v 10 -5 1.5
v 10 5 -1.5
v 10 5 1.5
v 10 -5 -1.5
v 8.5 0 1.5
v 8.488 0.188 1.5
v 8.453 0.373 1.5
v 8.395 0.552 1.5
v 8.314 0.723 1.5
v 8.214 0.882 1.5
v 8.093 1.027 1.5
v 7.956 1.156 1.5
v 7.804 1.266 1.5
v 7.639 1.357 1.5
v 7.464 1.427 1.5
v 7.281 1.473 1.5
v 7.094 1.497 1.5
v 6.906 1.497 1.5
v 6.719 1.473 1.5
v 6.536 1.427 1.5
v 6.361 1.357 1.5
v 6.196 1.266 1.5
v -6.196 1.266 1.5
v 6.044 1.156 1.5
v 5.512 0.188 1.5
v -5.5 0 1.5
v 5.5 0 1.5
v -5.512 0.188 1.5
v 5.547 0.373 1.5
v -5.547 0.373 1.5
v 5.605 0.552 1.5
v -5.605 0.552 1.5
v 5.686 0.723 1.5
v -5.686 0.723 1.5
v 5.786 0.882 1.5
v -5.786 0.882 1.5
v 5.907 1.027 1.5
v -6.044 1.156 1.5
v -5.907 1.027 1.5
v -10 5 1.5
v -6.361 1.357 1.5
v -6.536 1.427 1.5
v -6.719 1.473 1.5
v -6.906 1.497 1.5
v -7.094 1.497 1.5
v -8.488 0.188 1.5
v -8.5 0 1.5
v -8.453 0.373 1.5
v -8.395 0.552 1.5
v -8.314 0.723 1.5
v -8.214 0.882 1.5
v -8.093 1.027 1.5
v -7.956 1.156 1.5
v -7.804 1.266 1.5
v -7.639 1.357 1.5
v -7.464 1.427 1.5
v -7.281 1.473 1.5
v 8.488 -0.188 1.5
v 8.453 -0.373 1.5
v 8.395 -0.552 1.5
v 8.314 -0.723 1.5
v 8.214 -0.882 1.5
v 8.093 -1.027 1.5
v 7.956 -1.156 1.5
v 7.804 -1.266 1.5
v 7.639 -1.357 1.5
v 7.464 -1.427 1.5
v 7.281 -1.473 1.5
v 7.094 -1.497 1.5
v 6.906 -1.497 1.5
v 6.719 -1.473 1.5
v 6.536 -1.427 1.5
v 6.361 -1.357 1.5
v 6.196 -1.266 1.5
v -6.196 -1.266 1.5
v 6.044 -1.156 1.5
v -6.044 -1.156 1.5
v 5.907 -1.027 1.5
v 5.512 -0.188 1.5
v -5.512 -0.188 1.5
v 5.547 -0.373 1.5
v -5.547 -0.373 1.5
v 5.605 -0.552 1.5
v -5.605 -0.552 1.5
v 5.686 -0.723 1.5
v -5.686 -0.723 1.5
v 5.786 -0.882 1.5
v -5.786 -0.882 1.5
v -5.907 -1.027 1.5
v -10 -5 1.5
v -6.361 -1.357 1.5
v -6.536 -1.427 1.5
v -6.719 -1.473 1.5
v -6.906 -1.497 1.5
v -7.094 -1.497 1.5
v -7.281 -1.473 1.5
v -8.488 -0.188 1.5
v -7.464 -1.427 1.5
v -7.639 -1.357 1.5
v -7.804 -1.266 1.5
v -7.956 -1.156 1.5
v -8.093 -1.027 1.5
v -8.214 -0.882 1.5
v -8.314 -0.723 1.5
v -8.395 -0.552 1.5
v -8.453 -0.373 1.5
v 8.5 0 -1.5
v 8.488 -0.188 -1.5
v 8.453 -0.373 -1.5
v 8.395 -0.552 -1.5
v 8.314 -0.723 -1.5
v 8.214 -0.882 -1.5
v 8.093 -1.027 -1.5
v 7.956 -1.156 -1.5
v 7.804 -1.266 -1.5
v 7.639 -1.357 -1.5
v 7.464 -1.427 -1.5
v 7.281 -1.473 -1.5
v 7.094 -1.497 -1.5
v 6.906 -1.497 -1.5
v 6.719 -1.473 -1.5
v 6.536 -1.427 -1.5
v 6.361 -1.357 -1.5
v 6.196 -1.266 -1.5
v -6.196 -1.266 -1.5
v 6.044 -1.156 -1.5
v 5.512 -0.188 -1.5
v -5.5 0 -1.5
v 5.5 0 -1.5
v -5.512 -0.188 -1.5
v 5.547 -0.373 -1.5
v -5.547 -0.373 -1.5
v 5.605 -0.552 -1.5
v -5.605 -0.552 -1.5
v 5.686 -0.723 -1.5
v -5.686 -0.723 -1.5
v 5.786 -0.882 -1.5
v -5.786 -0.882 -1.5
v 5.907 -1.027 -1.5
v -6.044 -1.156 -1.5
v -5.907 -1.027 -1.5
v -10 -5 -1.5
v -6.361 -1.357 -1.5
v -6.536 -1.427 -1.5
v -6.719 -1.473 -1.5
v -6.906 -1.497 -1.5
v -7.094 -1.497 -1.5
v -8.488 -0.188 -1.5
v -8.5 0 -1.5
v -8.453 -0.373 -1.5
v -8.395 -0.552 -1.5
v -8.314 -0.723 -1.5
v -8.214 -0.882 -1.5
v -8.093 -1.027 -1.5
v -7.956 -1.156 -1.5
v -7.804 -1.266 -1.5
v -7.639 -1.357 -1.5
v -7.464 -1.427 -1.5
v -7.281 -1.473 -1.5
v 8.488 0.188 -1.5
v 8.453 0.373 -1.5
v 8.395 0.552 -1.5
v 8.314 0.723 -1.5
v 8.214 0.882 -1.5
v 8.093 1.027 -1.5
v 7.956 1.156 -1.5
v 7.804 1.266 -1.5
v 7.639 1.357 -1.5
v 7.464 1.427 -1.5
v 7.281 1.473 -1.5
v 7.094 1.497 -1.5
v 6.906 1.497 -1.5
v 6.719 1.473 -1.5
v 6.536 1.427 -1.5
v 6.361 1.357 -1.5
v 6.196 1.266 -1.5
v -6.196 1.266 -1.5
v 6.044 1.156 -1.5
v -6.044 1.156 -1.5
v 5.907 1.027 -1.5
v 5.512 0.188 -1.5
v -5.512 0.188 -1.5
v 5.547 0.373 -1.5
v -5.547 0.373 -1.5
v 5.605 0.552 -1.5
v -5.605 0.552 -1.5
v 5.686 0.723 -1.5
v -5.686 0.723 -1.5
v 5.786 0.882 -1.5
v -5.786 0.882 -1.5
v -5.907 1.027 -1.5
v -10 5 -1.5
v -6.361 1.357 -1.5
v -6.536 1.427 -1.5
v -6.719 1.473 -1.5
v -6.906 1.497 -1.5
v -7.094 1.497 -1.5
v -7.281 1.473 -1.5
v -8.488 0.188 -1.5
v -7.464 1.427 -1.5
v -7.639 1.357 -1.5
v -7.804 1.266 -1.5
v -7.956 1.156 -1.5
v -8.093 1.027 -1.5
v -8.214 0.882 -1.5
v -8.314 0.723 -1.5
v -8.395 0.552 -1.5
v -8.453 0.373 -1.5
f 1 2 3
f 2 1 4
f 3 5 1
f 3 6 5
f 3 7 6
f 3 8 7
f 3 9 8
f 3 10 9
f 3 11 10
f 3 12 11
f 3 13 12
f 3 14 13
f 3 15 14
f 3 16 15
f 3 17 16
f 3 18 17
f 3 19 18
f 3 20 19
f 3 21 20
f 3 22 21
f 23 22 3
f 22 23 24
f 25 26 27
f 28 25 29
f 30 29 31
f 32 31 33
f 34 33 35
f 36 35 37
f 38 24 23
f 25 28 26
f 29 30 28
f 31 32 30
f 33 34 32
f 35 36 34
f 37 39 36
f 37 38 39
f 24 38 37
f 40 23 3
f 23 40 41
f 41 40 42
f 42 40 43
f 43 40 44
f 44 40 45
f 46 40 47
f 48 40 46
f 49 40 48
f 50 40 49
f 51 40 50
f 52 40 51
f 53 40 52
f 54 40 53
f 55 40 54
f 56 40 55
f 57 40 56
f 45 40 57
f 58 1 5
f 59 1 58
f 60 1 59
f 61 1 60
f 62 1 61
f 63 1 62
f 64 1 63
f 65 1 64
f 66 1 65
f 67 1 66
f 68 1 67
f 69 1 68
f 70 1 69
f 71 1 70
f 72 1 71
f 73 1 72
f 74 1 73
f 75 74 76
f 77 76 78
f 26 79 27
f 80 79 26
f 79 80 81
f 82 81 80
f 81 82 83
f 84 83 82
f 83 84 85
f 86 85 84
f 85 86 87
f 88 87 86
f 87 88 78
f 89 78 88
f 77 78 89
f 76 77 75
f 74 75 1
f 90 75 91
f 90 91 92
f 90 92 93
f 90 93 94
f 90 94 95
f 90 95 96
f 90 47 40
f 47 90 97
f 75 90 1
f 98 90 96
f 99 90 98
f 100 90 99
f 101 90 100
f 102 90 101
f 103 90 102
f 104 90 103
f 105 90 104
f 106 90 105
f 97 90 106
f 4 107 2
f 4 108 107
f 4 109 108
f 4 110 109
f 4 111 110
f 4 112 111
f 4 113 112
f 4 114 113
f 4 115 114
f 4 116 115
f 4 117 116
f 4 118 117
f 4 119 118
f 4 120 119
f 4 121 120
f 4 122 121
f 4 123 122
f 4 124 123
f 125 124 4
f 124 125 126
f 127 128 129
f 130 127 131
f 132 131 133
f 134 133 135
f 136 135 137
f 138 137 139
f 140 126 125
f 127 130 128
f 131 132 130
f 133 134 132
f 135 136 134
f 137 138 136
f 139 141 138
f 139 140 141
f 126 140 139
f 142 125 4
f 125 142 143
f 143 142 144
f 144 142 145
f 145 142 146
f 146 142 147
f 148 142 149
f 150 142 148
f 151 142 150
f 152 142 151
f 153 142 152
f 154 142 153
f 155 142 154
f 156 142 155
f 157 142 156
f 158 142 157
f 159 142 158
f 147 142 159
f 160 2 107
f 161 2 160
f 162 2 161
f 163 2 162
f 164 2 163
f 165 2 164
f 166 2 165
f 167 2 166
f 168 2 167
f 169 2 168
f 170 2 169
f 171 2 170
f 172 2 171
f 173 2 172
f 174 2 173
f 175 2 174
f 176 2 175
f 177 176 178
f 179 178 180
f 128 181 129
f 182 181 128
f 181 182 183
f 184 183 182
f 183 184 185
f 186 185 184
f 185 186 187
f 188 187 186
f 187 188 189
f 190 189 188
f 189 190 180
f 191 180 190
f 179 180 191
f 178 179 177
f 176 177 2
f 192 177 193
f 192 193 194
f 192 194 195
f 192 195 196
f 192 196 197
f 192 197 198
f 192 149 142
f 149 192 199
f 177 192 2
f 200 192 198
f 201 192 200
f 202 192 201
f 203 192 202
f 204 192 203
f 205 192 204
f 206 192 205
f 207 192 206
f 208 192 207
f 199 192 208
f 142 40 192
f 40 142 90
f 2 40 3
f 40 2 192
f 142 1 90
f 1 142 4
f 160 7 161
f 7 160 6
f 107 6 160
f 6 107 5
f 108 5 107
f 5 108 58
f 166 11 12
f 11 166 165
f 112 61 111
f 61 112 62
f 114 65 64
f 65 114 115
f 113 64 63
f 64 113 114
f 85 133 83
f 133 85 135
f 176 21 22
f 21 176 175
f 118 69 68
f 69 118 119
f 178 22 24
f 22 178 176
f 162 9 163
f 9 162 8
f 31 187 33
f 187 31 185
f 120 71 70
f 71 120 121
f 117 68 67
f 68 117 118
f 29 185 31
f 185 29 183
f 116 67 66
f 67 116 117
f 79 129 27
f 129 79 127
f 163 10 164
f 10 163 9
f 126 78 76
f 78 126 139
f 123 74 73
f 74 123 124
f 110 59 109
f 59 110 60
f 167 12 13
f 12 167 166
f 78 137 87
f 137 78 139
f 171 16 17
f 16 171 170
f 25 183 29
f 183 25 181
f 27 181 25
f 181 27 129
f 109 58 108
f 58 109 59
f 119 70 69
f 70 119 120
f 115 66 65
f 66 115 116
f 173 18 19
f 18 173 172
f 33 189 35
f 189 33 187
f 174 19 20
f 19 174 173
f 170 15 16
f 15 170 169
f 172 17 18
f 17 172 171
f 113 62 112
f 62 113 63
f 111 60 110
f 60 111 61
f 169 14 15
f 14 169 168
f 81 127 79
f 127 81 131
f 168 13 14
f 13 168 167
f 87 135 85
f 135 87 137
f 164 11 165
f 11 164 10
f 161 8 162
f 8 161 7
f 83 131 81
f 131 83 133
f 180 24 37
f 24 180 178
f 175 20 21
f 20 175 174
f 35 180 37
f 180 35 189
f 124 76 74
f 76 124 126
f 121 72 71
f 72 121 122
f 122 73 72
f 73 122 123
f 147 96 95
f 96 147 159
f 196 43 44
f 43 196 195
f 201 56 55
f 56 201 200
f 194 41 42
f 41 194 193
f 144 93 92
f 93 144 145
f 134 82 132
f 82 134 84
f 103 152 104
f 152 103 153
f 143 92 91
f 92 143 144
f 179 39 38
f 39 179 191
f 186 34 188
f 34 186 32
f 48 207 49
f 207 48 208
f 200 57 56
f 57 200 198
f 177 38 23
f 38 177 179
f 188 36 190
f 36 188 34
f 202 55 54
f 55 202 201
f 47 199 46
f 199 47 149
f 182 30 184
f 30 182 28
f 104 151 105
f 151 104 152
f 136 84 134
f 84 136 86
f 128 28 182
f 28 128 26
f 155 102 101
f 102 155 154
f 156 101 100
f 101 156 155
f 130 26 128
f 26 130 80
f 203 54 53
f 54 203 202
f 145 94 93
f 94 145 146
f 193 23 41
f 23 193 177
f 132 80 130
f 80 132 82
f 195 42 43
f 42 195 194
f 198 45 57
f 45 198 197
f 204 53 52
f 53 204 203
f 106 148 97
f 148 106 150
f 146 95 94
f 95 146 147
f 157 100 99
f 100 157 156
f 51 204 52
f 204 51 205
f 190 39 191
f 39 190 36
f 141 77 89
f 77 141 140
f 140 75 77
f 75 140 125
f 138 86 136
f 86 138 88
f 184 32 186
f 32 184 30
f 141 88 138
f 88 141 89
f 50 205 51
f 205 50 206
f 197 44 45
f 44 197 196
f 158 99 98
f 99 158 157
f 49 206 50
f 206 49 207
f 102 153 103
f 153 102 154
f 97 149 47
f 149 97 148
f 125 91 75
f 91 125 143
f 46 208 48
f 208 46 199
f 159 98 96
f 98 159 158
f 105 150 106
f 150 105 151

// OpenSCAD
$fn=50;
larg=10;
long=20;
ep=3;
espace_trous=14;
dia_trous=3;

difference()
{
    cube([long,larg,ep],center=true);
    translate([espace_trous/2,0,0])
        cylinder(d=dia_trous,h=ep+0.2,center=true);
    translate([-espace_trous/2,0,0])
        cylinder(d=dia_trous,h=ep+0.2,center=true);
}
